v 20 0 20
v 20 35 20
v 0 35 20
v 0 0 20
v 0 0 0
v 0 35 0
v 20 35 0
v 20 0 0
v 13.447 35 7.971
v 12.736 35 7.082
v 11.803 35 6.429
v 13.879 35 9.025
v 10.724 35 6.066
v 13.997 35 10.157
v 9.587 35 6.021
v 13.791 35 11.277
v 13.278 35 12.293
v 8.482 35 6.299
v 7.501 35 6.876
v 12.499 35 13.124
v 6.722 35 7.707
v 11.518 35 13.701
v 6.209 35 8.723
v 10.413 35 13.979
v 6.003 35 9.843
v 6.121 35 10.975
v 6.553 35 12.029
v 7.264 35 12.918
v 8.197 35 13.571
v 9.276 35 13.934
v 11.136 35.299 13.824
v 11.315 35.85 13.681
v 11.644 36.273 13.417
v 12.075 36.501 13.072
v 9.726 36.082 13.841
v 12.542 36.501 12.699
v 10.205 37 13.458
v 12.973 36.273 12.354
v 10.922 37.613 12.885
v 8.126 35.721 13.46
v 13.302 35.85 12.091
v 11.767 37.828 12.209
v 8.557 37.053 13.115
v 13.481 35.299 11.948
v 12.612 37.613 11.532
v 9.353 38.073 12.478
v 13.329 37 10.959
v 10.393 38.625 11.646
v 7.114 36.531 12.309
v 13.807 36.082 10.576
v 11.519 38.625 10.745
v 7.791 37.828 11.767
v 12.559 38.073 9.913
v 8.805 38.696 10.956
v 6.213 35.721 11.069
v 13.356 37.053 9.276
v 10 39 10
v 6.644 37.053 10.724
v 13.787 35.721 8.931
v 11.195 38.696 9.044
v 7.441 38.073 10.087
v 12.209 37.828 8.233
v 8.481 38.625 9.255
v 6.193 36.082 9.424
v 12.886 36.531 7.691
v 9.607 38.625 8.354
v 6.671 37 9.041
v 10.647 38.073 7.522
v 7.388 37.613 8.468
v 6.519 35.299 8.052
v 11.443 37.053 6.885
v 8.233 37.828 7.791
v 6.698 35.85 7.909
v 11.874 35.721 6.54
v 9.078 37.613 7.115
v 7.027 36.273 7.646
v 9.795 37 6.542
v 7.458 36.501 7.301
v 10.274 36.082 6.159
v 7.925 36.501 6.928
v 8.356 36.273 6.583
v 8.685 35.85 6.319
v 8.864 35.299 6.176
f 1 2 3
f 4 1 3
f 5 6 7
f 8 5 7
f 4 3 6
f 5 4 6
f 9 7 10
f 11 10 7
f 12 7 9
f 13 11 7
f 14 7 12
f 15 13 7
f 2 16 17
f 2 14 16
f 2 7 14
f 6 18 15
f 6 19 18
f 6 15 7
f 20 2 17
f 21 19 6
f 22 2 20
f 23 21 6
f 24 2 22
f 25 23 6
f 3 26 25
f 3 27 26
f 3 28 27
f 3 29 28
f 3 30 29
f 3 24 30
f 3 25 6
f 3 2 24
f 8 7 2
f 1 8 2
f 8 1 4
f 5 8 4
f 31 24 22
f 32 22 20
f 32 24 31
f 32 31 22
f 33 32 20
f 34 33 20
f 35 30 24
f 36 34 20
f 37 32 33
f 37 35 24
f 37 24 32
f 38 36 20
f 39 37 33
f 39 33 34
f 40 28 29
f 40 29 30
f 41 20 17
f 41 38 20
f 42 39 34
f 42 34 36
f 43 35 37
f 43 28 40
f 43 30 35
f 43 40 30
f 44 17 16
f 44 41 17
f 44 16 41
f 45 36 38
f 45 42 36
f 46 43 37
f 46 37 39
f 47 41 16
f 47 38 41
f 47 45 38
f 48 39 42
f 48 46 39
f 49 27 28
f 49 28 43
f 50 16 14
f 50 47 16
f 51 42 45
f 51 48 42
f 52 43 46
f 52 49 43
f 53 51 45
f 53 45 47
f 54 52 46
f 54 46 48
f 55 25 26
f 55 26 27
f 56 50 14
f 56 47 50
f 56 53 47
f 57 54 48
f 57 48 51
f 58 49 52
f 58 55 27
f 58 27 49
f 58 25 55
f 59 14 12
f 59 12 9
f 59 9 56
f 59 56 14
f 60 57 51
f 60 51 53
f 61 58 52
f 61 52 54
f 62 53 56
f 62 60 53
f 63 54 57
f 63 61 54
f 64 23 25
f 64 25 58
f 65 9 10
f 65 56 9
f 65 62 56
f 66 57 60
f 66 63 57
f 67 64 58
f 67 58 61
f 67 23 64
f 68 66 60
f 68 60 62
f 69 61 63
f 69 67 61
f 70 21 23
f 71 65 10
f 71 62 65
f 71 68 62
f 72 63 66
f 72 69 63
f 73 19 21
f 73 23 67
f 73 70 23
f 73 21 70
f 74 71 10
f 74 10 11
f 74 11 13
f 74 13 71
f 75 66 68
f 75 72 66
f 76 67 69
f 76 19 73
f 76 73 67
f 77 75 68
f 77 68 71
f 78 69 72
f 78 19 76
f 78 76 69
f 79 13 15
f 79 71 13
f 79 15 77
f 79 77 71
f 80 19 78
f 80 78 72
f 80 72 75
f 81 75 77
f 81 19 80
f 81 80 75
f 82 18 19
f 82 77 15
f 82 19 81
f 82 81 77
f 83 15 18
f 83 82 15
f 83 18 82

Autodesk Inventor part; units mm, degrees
ref_plane "YZ Plane" through (0, 0, 0) normal (1, 0, 0) x (0, 1, 0)
ref_plane "XZ Plane" through (0, 0, 0) normal (0, 1, 0) x (-1, 0, 0)
ref_plane "XY Plane" through (0, 0, 0) normal (0, 0, 1) x (1, 0, 0)
sketch "スケッチ1" plane through (0, 0, 0) normal (0, 1, 0) x (-1, 0, 0)
  line L0 (0, 0) -> (-20, 0)
  line L1 (-20, 0) -> (-20, 20)
  line L2 (-20, 20) -> (0, 20)
  line L3 (0, 20) -> (0, 0)
  dimension "d0" = 20
  dimension "d1" = 20
extrude "押し出し1" add sketch "スケッチ1" along normal blind 35
sketch "スケッチ2" plane through (0, 35, 0) normal (0, 1, 0) x (1, 0, 0)
  line L0 (20, 0) -> (0, 0) projected
  line L1 (0, 0) -> (0, -20) projected
  line L2 (0, -20) -> (20, -20) projected
  line L3 (20, -20) -> (20, 0) projected
  line L4 (0, -10) -> (20, -10)
  line L5 (10, 0) -> (10, -20)
  circle A0 centre (10, -10) radius 4
  line L6 (12.4988, -13.1235) -> (7.5012, -6.8765)
  dimension "d4" = 8
revolve "回転1" add sketch "スケッチ2" angle 360 about axis through (12.4988, 35, 13.1235) along (-0.6246951, 0, -0.7808688) picked at (12.2437, -8.5902) picked at (8.5873, -7.7581) picked at (11.8763, -11.8713) contours A0 L4 L5 | L5 L6 A0 | A0 L6 L4
sketch "スケッチ3" plane through (0, 0, 0) normal (0, -1, 0) x (1, 0, 0)
  line L0 (0, 0) -> (20, 0) projected
  line L1 (20, 0) -> (20, 20) projected
  line L2 (20, 20) -> (0, 20) projected
  line L3 (0, 20) -> (0, 0) projected
  line L4 (20, 20) -> (0, 0)
  line L5 (0, 20) -> (20, 0)
  point P0 (10, 10)
properties part number "知能ロボコンボールキャスタ"
